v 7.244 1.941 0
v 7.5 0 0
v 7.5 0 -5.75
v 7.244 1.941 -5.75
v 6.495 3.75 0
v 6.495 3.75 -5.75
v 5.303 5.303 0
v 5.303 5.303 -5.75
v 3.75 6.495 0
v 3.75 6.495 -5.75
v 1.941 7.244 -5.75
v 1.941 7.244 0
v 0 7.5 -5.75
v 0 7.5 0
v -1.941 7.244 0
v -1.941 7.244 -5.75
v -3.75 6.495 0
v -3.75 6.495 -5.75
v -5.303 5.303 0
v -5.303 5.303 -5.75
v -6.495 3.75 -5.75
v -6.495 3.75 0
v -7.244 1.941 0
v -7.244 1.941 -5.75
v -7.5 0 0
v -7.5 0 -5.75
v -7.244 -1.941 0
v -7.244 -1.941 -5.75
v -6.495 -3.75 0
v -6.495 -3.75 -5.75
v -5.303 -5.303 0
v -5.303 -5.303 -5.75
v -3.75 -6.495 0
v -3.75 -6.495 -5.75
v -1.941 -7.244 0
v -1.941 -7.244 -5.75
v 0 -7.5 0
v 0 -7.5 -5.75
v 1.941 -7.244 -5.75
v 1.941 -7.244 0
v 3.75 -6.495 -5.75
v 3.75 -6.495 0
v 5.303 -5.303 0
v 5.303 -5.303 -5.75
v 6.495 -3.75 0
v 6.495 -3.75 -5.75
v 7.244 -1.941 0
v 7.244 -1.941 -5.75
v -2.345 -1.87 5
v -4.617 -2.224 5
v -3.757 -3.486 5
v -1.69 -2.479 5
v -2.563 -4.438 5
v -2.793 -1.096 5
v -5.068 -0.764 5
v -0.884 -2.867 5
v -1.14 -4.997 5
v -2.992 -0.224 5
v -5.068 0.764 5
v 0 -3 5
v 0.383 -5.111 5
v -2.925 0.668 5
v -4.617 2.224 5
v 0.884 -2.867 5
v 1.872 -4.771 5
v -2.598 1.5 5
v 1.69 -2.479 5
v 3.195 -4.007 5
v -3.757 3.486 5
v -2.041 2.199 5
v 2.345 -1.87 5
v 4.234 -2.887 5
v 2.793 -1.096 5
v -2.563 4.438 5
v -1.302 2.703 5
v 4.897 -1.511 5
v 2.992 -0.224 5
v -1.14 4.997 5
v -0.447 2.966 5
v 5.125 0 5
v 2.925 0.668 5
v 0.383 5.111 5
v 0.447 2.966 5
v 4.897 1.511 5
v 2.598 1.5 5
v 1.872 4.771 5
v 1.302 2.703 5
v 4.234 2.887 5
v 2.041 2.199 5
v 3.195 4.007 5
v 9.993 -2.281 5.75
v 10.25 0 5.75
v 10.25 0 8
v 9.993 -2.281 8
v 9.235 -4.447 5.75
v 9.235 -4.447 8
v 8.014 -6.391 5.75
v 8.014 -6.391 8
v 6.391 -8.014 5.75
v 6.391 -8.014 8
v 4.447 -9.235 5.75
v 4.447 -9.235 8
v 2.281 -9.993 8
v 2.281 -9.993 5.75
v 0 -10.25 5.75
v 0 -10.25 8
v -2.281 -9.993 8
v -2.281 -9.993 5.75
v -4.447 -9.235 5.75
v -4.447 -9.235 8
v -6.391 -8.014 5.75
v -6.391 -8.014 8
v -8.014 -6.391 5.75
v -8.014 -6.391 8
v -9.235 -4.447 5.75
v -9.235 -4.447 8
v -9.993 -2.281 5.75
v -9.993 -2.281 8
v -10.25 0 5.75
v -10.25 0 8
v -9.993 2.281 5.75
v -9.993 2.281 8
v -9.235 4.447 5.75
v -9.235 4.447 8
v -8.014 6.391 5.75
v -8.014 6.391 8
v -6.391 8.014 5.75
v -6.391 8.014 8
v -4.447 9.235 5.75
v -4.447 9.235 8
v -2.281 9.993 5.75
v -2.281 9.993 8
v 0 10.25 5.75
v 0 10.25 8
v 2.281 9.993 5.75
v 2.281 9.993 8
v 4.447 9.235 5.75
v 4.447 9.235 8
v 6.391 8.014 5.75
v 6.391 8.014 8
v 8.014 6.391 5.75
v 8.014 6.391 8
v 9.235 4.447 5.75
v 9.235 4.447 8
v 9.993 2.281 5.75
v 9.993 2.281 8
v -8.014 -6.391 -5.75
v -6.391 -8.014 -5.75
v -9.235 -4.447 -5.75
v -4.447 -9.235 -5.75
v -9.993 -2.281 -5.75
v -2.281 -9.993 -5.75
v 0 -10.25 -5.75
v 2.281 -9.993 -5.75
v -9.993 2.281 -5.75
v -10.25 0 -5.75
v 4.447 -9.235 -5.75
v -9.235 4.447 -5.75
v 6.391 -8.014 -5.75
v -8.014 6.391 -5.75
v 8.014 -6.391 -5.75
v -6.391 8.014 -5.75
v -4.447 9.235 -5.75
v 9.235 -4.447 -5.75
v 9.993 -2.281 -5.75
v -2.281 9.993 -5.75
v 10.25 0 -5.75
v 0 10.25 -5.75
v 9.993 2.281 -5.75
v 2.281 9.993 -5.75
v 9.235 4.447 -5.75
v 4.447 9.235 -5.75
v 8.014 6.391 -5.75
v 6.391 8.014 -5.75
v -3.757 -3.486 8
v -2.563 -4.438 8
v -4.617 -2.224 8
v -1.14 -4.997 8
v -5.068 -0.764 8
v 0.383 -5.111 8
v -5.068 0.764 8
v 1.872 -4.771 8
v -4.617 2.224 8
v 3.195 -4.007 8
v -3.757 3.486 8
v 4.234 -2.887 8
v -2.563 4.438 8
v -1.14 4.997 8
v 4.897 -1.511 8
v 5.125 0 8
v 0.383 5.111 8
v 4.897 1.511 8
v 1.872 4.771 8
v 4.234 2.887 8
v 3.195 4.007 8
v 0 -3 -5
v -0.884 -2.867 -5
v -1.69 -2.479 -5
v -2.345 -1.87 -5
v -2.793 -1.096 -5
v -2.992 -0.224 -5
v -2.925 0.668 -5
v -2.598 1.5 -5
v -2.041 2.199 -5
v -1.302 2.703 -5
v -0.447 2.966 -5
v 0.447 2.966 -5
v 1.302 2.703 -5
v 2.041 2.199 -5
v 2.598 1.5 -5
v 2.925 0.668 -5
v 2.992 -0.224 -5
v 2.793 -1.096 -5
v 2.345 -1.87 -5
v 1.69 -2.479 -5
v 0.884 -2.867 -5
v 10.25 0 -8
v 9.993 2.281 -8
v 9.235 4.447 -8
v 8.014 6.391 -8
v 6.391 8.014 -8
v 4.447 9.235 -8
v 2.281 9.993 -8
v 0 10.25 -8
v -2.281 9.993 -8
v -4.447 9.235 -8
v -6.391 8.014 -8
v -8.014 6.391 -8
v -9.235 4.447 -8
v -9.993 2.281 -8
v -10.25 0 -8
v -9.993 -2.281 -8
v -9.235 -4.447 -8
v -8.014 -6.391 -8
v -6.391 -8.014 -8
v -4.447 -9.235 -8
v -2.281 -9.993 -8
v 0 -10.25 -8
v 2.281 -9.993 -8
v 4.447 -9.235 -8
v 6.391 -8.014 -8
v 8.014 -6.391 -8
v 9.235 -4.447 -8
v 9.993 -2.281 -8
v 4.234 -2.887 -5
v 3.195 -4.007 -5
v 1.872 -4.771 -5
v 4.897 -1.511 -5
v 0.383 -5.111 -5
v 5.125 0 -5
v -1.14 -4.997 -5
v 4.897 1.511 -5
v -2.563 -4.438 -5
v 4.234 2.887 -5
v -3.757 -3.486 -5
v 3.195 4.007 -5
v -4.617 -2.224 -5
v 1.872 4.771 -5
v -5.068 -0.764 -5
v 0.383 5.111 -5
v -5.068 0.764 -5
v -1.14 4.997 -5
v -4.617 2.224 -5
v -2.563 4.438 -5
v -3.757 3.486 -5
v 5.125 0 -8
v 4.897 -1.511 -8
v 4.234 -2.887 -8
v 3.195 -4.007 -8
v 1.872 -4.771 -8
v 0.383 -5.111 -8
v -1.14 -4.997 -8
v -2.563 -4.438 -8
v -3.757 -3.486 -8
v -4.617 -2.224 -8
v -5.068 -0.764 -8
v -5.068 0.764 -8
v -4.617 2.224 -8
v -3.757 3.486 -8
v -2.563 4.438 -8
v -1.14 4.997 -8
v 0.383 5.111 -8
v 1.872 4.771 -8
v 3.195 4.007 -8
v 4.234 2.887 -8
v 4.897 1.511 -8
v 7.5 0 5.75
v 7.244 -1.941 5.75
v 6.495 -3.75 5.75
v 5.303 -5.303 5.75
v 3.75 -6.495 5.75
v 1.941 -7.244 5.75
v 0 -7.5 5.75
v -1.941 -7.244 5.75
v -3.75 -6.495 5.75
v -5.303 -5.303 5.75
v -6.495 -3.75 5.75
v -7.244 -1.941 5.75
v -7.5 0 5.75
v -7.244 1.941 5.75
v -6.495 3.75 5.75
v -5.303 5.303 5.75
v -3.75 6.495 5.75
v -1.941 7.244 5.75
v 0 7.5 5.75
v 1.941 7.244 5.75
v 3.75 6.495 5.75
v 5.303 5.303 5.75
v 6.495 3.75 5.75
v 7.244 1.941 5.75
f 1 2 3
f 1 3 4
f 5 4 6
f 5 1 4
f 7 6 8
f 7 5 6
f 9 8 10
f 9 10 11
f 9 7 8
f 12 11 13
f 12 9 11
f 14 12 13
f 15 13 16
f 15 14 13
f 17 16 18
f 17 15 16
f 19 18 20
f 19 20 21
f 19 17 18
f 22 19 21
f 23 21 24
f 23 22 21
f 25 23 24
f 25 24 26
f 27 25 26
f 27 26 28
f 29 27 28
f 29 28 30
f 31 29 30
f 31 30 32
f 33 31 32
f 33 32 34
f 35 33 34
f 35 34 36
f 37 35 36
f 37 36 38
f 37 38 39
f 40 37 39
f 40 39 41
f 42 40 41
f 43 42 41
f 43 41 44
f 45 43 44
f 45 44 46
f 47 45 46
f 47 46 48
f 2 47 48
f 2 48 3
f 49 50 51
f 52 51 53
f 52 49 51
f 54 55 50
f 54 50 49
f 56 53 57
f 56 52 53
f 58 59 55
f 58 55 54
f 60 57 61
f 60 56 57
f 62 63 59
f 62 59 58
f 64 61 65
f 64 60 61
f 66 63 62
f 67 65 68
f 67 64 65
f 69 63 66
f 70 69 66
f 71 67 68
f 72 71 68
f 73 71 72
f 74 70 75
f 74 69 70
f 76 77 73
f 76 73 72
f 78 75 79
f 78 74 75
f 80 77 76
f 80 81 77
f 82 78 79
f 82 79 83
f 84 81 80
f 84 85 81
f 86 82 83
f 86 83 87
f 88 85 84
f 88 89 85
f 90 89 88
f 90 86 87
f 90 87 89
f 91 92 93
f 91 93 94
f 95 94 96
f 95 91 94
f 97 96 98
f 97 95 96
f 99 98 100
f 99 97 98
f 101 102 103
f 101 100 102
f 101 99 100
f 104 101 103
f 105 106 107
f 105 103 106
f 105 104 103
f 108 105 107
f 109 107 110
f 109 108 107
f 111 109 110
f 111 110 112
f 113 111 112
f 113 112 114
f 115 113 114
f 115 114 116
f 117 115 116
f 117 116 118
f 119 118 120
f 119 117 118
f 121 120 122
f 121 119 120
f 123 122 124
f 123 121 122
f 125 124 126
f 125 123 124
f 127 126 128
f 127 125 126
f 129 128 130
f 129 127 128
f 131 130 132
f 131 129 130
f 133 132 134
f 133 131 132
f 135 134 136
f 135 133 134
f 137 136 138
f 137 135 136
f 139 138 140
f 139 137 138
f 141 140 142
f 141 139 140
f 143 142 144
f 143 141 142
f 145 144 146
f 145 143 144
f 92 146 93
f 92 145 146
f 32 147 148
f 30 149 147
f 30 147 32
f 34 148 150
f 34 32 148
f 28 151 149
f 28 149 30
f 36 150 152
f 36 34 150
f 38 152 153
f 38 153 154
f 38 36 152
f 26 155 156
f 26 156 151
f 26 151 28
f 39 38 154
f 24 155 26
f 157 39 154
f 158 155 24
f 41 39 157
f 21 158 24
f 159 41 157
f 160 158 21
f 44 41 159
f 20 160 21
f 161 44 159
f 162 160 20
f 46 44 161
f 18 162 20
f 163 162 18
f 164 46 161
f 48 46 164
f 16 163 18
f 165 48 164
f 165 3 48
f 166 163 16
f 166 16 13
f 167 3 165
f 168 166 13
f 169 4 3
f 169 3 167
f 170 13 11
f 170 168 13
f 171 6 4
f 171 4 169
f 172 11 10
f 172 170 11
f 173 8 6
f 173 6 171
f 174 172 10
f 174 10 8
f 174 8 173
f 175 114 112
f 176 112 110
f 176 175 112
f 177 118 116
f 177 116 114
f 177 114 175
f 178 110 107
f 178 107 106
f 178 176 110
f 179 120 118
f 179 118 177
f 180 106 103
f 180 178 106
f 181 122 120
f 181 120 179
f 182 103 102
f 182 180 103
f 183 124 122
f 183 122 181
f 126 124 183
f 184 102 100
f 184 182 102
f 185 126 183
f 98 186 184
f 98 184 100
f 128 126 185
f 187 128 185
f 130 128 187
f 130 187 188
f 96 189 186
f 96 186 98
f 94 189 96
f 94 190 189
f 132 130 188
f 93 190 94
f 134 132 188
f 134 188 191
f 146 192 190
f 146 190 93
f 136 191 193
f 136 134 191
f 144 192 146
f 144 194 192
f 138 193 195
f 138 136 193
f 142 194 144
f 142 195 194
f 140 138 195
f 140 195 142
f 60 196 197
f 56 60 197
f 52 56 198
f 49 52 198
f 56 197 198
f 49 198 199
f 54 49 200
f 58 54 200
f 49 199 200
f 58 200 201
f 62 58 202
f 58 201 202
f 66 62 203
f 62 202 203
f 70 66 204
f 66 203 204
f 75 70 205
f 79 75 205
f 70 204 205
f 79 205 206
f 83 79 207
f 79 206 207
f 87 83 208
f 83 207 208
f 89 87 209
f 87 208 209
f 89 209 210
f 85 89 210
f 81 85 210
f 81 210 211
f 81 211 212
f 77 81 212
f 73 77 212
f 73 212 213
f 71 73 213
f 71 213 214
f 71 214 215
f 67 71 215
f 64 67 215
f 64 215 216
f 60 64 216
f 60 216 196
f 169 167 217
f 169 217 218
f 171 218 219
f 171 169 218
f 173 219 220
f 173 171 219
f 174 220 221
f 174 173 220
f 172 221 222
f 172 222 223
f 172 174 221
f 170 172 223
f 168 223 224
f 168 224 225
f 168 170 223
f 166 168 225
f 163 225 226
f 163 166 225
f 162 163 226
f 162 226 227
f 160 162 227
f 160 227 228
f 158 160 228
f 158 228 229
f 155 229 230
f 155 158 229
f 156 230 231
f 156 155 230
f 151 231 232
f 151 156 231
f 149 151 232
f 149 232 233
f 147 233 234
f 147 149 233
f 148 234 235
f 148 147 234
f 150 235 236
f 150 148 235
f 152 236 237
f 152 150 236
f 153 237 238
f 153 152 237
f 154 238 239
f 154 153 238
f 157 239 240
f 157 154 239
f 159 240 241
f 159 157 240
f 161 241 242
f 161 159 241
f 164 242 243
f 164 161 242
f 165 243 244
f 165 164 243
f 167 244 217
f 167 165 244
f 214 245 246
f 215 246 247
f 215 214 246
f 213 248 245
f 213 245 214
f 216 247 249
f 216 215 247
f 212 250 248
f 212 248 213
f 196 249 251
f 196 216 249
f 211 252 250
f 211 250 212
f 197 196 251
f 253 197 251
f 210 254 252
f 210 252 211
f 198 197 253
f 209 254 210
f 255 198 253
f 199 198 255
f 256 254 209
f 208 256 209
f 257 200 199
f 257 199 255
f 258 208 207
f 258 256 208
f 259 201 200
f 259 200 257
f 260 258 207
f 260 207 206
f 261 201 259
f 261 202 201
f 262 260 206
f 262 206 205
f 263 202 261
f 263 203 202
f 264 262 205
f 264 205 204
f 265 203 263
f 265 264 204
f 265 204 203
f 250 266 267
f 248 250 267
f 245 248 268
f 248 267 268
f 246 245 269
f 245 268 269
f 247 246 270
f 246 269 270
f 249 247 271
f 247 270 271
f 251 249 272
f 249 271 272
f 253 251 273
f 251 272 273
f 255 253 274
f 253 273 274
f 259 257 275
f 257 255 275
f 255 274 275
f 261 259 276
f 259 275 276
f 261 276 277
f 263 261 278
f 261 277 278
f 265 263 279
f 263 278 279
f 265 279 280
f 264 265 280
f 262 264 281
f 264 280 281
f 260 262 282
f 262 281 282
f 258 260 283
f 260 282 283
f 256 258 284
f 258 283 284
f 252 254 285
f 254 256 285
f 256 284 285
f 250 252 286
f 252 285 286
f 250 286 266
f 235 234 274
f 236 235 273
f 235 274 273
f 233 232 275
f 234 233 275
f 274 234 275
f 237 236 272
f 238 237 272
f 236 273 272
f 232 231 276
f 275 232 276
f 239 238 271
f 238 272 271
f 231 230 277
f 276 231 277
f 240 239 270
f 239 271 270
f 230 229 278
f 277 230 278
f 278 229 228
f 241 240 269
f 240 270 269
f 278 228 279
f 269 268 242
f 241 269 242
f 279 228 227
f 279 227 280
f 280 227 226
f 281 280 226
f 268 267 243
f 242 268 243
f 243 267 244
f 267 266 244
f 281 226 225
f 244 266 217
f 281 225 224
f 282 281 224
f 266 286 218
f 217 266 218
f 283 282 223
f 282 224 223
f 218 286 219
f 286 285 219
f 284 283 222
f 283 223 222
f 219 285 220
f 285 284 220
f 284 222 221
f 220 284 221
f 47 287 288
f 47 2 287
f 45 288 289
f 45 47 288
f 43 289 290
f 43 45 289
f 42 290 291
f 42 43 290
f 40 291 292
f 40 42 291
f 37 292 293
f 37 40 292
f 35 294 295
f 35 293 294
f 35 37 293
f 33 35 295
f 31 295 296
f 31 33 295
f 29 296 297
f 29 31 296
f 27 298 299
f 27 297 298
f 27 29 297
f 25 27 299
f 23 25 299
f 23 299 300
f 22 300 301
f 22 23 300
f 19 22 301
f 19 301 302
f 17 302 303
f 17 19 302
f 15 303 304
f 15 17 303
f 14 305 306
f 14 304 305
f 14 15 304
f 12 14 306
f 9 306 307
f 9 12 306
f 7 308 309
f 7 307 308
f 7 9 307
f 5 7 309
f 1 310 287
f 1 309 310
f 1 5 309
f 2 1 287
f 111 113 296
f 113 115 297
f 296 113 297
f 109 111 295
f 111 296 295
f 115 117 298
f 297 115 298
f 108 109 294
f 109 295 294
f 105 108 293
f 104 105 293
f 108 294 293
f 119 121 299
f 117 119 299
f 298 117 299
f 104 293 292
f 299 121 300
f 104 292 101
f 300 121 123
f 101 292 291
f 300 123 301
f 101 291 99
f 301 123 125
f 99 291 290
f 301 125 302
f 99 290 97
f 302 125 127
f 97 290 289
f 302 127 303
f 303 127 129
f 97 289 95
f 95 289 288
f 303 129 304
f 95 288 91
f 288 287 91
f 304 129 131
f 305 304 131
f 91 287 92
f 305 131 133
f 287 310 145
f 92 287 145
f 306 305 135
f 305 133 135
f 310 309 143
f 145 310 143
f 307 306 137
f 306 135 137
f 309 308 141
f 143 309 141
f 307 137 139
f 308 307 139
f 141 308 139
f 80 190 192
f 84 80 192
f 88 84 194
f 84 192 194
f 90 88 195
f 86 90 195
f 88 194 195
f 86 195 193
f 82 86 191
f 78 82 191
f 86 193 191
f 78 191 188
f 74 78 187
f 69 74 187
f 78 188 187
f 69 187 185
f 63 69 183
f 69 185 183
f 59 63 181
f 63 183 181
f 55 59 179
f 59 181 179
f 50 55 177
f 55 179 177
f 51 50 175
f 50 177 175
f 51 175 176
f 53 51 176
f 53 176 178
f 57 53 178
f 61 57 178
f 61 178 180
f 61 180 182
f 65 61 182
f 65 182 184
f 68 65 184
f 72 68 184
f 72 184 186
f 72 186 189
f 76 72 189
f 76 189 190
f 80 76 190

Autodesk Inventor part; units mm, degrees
ref_plane "YZ Plane" through (0, 0, 0) normal (1, 0, 0) x (0, 1, 0)
ref_plane "XZ Plane" through (0, 0, 0) normal (0, 1, 0) x (-1, 0, 0)
ref_plane "XY Plane" through (0, 0, 0) normal (0, 0, 1) x (1, 0, 0)
sketch "Base" plane through (0, 0, 0) normal (0, 0, 1) x (1, 0, 0)
  circle A0 centre (0, 0) radius 10.25
  dimension "d0" = 20.5
extrude "BaseFeature" add sketch "Base" along normal mid plane 16
sketch "Ridges" plane through (0, 0, 0) normal (0, 0, 1) x (1, 0, 0)
  circle A0 centre (0, 0) radius 10.25 projected
  circle A1 centre (0, 0) radius 7.5
  dimension "d3" = 15
extrude "RidgesFeature" cut sketch "Ridges" along normal mid plane 11.5
sketch "Countersink" plane through (0, 0, 8) normal (0, 0, 1) x (1, 0, 0)
  circle A0 centre (0, 0) radius 5.125
  dimension "d6" = 10.25
extrude "CountersinkFeature" cut sketch "Countersink" against normal blind 3
mirror "CountersinkMirrorFeature" about plane through (0, 0, 0) normal (0, 0, 1) of "CountersinkFeature"
sketch "MountHole" plane through (0, 0, 5) normal (0, 0, 1) x (1, 0, 0)
  point P0 (0, 0)
hole "MountHoleFeature" at (0, 0, 5) direction (0, 0, -1) diameter 6 end through all
properties part number "LegChainTensionerBlock"
